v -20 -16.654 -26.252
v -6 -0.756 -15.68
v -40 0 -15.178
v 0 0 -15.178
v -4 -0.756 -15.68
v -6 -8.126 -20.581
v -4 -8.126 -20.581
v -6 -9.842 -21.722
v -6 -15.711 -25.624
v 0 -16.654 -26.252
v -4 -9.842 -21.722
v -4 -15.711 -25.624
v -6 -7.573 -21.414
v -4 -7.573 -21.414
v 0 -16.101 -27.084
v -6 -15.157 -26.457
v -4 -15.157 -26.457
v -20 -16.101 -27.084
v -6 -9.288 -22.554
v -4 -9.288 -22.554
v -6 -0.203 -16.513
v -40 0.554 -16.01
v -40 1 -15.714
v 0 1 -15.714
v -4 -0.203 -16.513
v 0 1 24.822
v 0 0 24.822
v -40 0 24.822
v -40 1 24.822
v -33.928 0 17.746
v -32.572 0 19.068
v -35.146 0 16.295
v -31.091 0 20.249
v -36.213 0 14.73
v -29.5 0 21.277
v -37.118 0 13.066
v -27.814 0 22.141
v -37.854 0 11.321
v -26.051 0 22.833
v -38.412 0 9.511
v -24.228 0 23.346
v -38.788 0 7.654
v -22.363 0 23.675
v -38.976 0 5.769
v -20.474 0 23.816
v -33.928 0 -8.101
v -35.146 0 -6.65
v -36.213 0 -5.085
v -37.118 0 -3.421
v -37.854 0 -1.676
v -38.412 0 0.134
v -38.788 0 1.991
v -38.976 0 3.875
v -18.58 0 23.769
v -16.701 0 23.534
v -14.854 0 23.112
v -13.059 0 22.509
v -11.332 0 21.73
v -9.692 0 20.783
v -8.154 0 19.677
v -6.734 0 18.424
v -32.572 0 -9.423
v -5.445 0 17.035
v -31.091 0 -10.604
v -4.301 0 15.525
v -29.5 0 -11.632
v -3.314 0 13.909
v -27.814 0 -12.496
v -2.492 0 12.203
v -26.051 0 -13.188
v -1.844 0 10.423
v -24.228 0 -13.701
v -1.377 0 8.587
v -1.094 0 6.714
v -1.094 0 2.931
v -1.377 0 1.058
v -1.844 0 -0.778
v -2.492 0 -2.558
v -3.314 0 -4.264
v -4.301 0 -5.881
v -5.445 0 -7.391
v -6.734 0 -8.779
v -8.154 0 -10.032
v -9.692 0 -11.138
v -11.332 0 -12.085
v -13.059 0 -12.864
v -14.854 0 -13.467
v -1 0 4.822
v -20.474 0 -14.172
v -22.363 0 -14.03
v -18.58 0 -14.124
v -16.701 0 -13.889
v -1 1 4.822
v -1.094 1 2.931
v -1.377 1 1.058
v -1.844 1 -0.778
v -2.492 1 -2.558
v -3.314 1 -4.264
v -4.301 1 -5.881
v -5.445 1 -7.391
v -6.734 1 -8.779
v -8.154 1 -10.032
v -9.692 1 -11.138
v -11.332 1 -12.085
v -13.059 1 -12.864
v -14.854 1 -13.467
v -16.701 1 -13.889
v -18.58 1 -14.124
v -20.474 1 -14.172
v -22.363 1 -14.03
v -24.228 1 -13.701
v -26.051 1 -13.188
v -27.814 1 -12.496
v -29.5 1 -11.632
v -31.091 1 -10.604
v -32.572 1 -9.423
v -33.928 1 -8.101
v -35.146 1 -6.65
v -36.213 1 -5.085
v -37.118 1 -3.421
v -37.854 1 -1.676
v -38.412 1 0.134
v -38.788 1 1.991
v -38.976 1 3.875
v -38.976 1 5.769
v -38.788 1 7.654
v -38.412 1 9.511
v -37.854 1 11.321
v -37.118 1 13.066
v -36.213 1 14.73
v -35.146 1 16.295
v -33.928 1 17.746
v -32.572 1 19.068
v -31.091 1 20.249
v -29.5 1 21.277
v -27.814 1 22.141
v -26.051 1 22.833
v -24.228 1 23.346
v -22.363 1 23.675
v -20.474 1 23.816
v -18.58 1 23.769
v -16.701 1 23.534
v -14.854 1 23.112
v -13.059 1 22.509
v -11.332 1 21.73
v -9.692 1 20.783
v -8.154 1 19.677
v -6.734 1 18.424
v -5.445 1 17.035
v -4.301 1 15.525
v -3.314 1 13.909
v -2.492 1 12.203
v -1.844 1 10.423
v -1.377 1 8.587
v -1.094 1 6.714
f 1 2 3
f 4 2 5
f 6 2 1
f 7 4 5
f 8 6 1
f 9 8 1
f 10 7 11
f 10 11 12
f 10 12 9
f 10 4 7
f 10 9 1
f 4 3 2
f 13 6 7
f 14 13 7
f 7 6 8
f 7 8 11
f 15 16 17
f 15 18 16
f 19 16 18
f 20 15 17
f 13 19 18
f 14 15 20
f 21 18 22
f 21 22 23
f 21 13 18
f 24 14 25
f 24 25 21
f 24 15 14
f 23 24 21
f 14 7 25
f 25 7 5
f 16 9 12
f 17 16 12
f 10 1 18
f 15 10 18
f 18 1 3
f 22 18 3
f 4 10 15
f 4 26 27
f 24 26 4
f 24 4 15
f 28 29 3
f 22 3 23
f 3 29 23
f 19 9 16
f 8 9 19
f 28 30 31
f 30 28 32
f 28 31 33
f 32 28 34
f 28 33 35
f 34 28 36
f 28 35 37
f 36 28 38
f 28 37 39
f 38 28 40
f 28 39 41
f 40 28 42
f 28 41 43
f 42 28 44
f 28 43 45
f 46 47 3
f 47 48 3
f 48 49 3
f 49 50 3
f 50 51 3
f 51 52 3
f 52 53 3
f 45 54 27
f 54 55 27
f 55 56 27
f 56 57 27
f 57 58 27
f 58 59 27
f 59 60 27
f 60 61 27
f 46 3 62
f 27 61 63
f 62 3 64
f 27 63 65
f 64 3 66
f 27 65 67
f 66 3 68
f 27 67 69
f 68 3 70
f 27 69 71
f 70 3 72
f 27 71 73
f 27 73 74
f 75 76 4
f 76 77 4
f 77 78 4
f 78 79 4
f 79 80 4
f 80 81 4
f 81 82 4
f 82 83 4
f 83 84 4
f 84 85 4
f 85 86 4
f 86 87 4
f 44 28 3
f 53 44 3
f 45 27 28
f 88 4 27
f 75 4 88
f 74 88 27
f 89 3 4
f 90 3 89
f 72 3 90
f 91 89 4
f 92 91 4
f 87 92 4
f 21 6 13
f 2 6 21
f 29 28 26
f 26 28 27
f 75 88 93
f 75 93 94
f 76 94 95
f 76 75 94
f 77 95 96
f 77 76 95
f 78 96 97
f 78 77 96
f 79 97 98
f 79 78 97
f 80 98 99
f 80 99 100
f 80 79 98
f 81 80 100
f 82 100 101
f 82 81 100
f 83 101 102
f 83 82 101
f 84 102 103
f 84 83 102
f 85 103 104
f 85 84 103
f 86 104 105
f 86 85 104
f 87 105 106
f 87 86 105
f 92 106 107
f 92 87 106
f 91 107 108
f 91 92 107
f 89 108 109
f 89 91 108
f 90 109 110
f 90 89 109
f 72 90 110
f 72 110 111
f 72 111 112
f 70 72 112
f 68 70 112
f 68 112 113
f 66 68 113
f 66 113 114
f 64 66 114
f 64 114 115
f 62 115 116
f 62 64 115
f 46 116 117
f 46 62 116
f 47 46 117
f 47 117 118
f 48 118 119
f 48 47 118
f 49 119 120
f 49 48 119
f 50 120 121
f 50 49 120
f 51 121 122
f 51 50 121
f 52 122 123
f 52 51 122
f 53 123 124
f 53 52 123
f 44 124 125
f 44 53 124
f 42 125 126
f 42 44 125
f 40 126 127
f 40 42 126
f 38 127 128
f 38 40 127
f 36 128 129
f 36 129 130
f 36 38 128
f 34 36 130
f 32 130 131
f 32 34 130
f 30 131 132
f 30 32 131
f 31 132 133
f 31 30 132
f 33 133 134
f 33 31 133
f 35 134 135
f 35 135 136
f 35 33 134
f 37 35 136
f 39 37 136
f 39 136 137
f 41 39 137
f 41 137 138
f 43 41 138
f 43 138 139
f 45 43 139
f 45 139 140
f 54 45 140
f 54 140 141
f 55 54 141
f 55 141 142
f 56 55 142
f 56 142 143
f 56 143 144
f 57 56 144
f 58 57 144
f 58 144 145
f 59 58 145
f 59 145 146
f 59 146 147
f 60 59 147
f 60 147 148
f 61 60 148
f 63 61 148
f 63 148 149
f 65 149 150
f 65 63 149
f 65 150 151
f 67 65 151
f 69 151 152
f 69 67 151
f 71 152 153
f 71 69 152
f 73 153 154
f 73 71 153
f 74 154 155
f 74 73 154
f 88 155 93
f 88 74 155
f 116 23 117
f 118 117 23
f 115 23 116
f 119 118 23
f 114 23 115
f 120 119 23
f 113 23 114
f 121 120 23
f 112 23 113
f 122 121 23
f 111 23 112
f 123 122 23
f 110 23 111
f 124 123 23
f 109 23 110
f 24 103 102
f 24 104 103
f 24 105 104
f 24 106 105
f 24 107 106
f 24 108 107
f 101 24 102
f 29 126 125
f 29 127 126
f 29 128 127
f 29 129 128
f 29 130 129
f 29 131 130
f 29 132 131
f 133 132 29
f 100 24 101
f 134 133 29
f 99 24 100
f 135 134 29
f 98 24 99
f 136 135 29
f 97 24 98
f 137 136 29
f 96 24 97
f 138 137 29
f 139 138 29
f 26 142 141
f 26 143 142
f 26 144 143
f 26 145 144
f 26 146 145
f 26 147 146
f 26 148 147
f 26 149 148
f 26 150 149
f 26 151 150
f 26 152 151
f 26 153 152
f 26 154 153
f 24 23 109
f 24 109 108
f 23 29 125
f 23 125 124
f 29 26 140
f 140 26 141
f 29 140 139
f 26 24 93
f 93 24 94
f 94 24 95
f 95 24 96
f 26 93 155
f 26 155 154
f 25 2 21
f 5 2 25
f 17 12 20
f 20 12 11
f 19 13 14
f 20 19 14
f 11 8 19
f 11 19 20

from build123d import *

# Parameters (mm, degrees)
SKETCH1_W           = 40
SKETCH1_H           = 40
SKETCH1_R           = 19
BOSS_EXTRUDE1_DEPTH = 1
BOSS_EXTRUDE3_DEPTH = 40
CUT_EXTRUDE1_DEPTH  = 40
SKETCH4_W           = 2
SKETCH4_H           = 17.959199538
CUT_EXTRUDE2_DEPTH  = 40
SKETCH5_W           = 4.291289536
SKETCH5_H           = 2.060082618
BOSS_EXTRUDE4_DEPTH = 1


with BuildPart() as part:
    # Sketch1 → Boss-Extrude1 (new body)
    with BuildSketch(Plane(origin=(0, 0, 0), x_dir=(1, 0, 0), z_dir=(0, 1, 0))):
        with Locations((-20, -4.822405003)):
            Rectangle(SKETCH1_W, SKETCH1_H)
        with Locations((-20, -4.822405003)):
            Circle(SKETCH1_R, mode=Mode.SUBTRACT)
    extrude(amount=BOSS_EXTRUDE1_DEPTH)

    # Sketch2 → Boss-Extrude3 (add)
    with BuildSketch(Plane(origin=(0, 0, 0), x_dir=(0, 0, -1), z_dir=(1, 0, 0))):
        Polygon((15.177594997, 0), (26.251567878, -16.654342515), (27.084285004, -16.100643871), (15.713552938, 1), (15.177594997, 1), align=None)
    extrude(amount=-BOSS_EXTRUDE3_DEPTH)

    # Sketch3 → Cut-Extrude1 (cut)
    with BuildSketch(Plane(origin=(0, 6.997999648, -10.524414707), x_dir=(1, 0, 0), z_dir=(0, -0.553698644, 0.832717126))):
        Polygon((-20, -28.40381377), (-40, -8.40381377), (-40, -28.40381377), align=None)
    extrude(amount=-CUT_EXTRUDE1_DEPTH, mode=Mode.SUBTRACT)

    # Sketch4 → Cut-Extrude2 (cut)
    with BuildSketch(Plane(origin=(0, 6.997999648, -10.524414707), x_dir=(1, 0, 0), z_dir=(0, -0.553698644, 0.832717126))):
        with Locations((-5, -18.291545123)):
            Rectangle(SKETCH4_W, SKETCH4_H)
    extrude(amount=-CUT_EXTRUDE2_DEPTH, mode=Mode.SUBTRACT)

    # Sketch5 → Boss-Extrude4 (add)
    with BuildSketch(Plane(origin=(0, 6.997999648, -10.524414707), x_dir=(1, 0, 0), z_dir=(0, -0.553698644, 0.832717126))):
        with Locations((-5.191272024, -19.192802864)):
            Rectangle(SKETCH5_W, SKETCH5_H)
    extrude(amount=-BOSS_EXTRUDE4_DEPTH)


solid = part.part
